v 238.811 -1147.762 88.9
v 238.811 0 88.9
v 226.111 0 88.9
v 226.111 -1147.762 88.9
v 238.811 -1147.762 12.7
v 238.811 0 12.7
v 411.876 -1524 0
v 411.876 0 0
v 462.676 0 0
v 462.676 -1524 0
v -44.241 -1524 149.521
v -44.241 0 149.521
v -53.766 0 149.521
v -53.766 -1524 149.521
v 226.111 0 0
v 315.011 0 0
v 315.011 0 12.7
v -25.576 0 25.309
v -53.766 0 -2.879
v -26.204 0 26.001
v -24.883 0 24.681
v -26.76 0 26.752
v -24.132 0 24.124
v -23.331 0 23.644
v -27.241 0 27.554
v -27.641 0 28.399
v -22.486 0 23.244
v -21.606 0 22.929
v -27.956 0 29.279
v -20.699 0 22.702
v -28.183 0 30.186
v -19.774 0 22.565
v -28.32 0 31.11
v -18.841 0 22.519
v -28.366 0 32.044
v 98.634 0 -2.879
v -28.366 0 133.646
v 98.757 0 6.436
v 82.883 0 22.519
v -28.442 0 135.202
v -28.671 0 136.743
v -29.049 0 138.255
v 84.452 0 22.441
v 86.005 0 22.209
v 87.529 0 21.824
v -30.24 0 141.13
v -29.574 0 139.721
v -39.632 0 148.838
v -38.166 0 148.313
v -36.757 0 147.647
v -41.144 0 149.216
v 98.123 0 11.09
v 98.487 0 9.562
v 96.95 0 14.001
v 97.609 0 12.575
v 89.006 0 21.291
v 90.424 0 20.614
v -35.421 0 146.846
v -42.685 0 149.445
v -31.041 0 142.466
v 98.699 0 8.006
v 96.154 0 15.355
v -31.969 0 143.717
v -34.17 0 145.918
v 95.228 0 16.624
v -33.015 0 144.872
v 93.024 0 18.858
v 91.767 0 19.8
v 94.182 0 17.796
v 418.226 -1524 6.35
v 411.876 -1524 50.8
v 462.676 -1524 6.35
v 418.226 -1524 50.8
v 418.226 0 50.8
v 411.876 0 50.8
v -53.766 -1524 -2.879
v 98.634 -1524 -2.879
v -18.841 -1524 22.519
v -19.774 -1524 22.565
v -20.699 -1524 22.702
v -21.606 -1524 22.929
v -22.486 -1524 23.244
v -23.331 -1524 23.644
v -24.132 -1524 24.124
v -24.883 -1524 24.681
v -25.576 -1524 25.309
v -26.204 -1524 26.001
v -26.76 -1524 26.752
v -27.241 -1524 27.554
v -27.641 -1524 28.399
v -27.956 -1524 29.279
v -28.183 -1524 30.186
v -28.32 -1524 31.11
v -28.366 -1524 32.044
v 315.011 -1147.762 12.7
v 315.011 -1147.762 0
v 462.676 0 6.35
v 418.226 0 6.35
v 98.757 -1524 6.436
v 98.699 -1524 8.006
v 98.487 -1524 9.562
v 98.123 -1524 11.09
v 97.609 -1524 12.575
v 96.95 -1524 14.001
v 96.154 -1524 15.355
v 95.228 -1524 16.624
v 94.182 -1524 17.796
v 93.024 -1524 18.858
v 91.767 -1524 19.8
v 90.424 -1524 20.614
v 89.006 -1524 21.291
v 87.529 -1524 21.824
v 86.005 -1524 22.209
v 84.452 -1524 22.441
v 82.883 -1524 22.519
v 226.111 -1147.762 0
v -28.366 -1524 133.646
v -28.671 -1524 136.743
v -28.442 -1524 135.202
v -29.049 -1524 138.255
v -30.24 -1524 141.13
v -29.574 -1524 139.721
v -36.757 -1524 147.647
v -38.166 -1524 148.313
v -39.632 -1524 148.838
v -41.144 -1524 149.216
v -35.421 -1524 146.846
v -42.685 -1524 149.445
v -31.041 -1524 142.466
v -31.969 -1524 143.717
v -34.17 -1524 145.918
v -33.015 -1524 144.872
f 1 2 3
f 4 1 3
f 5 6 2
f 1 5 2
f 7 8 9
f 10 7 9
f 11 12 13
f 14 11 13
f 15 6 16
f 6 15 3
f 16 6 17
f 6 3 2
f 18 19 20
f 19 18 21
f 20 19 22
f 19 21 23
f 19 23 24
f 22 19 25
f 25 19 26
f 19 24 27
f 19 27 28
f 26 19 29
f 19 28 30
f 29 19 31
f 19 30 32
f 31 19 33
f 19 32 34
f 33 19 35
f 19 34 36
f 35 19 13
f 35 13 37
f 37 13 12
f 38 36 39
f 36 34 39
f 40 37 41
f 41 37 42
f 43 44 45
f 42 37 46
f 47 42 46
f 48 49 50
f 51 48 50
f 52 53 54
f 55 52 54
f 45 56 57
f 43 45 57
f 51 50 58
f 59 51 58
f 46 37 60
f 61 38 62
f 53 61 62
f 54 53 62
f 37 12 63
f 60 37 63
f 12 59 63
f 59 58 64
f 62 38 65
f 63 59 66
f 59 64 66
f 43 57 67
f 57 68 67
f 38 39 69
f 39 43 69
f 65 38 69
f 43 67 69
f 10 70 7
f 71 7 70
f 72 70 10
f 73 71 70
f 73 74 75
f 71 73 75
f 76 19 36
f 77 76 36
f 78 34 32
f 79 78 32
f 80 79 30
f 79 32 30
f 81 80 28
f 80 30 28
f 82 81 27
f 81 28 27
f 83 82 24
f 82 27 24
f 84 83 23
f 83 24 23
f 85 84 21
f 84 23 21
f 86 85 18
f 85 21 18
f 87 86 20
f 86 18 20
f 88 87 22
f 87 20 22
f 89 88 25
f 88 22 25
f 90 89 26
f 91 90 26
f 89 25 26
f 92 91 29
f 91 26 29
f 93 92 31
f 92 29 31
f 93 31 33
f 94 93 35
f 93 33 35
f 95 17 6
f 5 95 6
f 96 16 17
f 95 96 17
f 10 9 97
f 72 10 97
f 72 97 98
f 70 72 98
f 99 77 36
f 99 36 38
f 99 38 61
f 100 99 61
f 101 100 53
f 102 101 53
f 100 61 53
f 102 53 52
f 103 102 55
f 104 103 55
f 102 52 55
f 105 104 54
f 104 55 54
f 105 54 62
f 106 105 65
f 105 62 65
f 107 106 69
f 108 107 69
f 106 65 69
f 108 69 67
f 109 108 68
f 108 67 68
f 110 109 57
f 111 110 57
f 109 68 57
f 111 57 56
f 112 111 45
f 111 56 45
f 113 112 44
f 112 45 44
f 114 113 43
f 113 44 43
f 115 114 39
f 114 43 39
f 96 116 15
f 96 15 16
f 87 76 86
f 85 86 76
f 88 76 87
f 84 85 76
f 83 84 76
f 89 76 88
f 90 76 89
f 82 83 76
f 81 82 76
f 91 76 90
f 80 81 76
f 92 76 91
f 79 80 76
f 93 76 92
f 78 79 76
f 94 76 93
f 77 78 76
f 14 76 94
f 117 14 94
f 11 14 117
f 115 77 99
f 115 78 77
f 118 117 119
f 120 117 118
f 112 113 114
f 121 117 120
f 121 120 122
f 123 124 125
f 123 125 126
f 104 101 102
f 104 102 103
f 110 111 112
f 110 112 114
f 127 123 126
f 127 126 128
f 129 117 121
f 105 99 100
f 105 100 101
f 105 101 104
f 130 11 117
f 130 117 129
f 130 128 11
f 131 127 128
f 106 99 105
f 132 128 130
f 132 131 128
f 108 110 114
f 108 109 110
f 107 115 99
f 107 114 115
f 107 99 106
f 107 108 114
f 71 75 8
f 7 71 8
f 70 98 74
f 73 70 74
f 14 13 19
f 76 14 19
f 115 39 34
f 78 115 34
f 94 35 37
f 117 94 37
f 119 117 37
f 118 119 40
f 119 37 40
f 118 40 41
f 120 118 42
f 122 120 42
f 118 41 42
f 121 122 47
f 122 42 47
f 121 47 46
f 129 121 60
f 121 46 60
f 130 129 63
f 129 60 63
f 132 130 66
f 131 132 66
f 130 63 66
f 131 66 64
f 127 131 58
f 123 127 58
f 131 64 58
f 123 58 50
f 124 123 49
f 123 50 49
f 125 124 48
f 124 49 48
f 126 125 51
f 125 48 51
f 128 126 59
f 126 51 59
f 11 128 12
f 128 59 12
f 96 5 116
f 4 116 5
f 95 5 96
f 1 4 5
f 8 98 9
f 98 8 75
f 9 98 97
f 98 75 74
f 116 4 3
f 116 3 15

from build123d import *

# Parameters (mm, degrees)
F1_DEPTH = 1524
F3_DEPTH = 1147.7625
F5_DEPTH = 1524


with BuildPart() as f1:
    # F0 (on Front) → F1 (new body)
    with BuildSketch(Plane.XZ):
        with BuildLine():
            Line((-44.240689, 149.521273), (-53.765689, 149.521273))
            Line((-53.765689, 149.521273), (-53.765689, -2.878727))
            Line((-53.765689, -2.878727), (98.634311, -2.878727))
            Line((98.634311, -2.878727), (98.756512, 6.435835))
            ThreePointArc((98.756512, 6.435835), (94.181587, 17.795536), (82.882878, 22.519087))
            Line((82.882878, 22.519087), (-18.840689, 22.519087))
            ThreePointArc((-18.840689, 22.519087), (-25.575881, 25.308895), (-28.365689, 32.044087))
            Line((-28.365689, 32.044087), (-28.365689, 133.646273))
            ThreePointArc((-28.365689, 133.646273), (-33.015369, 144.871593), (-44.240689, 149.521273))
        make_face()
    extrude(amount=F1_DEPTH)


with BuildPart() as f3:
    # F2 (on Front) → F3 (new body)
    with BuildSketch(Plane.XZ):
        Polygon((238.811054, 88.9), (226.111054, 88.9), (226.111054, 0), (315.011054, 0), (315.011054, 12.7), (238.811054, 12.7), align=None)
    extrude(amount=F3_DEPTH)


with BuildPart() as f5:
    # F4 (on Front) → F5 (new body)
    with BuildSketch(Plane.XZ):
        Polygon((418.226479, 50.8), (411.876479, 50.8), (411.876479, 0), (462.676479, 0), (462.676479, 6.35), (418.226479, 6.35), align=None)
    extrude(amount=F5_DEPTH)


solid = Compound([f1.part, f3.part, f5.part])
